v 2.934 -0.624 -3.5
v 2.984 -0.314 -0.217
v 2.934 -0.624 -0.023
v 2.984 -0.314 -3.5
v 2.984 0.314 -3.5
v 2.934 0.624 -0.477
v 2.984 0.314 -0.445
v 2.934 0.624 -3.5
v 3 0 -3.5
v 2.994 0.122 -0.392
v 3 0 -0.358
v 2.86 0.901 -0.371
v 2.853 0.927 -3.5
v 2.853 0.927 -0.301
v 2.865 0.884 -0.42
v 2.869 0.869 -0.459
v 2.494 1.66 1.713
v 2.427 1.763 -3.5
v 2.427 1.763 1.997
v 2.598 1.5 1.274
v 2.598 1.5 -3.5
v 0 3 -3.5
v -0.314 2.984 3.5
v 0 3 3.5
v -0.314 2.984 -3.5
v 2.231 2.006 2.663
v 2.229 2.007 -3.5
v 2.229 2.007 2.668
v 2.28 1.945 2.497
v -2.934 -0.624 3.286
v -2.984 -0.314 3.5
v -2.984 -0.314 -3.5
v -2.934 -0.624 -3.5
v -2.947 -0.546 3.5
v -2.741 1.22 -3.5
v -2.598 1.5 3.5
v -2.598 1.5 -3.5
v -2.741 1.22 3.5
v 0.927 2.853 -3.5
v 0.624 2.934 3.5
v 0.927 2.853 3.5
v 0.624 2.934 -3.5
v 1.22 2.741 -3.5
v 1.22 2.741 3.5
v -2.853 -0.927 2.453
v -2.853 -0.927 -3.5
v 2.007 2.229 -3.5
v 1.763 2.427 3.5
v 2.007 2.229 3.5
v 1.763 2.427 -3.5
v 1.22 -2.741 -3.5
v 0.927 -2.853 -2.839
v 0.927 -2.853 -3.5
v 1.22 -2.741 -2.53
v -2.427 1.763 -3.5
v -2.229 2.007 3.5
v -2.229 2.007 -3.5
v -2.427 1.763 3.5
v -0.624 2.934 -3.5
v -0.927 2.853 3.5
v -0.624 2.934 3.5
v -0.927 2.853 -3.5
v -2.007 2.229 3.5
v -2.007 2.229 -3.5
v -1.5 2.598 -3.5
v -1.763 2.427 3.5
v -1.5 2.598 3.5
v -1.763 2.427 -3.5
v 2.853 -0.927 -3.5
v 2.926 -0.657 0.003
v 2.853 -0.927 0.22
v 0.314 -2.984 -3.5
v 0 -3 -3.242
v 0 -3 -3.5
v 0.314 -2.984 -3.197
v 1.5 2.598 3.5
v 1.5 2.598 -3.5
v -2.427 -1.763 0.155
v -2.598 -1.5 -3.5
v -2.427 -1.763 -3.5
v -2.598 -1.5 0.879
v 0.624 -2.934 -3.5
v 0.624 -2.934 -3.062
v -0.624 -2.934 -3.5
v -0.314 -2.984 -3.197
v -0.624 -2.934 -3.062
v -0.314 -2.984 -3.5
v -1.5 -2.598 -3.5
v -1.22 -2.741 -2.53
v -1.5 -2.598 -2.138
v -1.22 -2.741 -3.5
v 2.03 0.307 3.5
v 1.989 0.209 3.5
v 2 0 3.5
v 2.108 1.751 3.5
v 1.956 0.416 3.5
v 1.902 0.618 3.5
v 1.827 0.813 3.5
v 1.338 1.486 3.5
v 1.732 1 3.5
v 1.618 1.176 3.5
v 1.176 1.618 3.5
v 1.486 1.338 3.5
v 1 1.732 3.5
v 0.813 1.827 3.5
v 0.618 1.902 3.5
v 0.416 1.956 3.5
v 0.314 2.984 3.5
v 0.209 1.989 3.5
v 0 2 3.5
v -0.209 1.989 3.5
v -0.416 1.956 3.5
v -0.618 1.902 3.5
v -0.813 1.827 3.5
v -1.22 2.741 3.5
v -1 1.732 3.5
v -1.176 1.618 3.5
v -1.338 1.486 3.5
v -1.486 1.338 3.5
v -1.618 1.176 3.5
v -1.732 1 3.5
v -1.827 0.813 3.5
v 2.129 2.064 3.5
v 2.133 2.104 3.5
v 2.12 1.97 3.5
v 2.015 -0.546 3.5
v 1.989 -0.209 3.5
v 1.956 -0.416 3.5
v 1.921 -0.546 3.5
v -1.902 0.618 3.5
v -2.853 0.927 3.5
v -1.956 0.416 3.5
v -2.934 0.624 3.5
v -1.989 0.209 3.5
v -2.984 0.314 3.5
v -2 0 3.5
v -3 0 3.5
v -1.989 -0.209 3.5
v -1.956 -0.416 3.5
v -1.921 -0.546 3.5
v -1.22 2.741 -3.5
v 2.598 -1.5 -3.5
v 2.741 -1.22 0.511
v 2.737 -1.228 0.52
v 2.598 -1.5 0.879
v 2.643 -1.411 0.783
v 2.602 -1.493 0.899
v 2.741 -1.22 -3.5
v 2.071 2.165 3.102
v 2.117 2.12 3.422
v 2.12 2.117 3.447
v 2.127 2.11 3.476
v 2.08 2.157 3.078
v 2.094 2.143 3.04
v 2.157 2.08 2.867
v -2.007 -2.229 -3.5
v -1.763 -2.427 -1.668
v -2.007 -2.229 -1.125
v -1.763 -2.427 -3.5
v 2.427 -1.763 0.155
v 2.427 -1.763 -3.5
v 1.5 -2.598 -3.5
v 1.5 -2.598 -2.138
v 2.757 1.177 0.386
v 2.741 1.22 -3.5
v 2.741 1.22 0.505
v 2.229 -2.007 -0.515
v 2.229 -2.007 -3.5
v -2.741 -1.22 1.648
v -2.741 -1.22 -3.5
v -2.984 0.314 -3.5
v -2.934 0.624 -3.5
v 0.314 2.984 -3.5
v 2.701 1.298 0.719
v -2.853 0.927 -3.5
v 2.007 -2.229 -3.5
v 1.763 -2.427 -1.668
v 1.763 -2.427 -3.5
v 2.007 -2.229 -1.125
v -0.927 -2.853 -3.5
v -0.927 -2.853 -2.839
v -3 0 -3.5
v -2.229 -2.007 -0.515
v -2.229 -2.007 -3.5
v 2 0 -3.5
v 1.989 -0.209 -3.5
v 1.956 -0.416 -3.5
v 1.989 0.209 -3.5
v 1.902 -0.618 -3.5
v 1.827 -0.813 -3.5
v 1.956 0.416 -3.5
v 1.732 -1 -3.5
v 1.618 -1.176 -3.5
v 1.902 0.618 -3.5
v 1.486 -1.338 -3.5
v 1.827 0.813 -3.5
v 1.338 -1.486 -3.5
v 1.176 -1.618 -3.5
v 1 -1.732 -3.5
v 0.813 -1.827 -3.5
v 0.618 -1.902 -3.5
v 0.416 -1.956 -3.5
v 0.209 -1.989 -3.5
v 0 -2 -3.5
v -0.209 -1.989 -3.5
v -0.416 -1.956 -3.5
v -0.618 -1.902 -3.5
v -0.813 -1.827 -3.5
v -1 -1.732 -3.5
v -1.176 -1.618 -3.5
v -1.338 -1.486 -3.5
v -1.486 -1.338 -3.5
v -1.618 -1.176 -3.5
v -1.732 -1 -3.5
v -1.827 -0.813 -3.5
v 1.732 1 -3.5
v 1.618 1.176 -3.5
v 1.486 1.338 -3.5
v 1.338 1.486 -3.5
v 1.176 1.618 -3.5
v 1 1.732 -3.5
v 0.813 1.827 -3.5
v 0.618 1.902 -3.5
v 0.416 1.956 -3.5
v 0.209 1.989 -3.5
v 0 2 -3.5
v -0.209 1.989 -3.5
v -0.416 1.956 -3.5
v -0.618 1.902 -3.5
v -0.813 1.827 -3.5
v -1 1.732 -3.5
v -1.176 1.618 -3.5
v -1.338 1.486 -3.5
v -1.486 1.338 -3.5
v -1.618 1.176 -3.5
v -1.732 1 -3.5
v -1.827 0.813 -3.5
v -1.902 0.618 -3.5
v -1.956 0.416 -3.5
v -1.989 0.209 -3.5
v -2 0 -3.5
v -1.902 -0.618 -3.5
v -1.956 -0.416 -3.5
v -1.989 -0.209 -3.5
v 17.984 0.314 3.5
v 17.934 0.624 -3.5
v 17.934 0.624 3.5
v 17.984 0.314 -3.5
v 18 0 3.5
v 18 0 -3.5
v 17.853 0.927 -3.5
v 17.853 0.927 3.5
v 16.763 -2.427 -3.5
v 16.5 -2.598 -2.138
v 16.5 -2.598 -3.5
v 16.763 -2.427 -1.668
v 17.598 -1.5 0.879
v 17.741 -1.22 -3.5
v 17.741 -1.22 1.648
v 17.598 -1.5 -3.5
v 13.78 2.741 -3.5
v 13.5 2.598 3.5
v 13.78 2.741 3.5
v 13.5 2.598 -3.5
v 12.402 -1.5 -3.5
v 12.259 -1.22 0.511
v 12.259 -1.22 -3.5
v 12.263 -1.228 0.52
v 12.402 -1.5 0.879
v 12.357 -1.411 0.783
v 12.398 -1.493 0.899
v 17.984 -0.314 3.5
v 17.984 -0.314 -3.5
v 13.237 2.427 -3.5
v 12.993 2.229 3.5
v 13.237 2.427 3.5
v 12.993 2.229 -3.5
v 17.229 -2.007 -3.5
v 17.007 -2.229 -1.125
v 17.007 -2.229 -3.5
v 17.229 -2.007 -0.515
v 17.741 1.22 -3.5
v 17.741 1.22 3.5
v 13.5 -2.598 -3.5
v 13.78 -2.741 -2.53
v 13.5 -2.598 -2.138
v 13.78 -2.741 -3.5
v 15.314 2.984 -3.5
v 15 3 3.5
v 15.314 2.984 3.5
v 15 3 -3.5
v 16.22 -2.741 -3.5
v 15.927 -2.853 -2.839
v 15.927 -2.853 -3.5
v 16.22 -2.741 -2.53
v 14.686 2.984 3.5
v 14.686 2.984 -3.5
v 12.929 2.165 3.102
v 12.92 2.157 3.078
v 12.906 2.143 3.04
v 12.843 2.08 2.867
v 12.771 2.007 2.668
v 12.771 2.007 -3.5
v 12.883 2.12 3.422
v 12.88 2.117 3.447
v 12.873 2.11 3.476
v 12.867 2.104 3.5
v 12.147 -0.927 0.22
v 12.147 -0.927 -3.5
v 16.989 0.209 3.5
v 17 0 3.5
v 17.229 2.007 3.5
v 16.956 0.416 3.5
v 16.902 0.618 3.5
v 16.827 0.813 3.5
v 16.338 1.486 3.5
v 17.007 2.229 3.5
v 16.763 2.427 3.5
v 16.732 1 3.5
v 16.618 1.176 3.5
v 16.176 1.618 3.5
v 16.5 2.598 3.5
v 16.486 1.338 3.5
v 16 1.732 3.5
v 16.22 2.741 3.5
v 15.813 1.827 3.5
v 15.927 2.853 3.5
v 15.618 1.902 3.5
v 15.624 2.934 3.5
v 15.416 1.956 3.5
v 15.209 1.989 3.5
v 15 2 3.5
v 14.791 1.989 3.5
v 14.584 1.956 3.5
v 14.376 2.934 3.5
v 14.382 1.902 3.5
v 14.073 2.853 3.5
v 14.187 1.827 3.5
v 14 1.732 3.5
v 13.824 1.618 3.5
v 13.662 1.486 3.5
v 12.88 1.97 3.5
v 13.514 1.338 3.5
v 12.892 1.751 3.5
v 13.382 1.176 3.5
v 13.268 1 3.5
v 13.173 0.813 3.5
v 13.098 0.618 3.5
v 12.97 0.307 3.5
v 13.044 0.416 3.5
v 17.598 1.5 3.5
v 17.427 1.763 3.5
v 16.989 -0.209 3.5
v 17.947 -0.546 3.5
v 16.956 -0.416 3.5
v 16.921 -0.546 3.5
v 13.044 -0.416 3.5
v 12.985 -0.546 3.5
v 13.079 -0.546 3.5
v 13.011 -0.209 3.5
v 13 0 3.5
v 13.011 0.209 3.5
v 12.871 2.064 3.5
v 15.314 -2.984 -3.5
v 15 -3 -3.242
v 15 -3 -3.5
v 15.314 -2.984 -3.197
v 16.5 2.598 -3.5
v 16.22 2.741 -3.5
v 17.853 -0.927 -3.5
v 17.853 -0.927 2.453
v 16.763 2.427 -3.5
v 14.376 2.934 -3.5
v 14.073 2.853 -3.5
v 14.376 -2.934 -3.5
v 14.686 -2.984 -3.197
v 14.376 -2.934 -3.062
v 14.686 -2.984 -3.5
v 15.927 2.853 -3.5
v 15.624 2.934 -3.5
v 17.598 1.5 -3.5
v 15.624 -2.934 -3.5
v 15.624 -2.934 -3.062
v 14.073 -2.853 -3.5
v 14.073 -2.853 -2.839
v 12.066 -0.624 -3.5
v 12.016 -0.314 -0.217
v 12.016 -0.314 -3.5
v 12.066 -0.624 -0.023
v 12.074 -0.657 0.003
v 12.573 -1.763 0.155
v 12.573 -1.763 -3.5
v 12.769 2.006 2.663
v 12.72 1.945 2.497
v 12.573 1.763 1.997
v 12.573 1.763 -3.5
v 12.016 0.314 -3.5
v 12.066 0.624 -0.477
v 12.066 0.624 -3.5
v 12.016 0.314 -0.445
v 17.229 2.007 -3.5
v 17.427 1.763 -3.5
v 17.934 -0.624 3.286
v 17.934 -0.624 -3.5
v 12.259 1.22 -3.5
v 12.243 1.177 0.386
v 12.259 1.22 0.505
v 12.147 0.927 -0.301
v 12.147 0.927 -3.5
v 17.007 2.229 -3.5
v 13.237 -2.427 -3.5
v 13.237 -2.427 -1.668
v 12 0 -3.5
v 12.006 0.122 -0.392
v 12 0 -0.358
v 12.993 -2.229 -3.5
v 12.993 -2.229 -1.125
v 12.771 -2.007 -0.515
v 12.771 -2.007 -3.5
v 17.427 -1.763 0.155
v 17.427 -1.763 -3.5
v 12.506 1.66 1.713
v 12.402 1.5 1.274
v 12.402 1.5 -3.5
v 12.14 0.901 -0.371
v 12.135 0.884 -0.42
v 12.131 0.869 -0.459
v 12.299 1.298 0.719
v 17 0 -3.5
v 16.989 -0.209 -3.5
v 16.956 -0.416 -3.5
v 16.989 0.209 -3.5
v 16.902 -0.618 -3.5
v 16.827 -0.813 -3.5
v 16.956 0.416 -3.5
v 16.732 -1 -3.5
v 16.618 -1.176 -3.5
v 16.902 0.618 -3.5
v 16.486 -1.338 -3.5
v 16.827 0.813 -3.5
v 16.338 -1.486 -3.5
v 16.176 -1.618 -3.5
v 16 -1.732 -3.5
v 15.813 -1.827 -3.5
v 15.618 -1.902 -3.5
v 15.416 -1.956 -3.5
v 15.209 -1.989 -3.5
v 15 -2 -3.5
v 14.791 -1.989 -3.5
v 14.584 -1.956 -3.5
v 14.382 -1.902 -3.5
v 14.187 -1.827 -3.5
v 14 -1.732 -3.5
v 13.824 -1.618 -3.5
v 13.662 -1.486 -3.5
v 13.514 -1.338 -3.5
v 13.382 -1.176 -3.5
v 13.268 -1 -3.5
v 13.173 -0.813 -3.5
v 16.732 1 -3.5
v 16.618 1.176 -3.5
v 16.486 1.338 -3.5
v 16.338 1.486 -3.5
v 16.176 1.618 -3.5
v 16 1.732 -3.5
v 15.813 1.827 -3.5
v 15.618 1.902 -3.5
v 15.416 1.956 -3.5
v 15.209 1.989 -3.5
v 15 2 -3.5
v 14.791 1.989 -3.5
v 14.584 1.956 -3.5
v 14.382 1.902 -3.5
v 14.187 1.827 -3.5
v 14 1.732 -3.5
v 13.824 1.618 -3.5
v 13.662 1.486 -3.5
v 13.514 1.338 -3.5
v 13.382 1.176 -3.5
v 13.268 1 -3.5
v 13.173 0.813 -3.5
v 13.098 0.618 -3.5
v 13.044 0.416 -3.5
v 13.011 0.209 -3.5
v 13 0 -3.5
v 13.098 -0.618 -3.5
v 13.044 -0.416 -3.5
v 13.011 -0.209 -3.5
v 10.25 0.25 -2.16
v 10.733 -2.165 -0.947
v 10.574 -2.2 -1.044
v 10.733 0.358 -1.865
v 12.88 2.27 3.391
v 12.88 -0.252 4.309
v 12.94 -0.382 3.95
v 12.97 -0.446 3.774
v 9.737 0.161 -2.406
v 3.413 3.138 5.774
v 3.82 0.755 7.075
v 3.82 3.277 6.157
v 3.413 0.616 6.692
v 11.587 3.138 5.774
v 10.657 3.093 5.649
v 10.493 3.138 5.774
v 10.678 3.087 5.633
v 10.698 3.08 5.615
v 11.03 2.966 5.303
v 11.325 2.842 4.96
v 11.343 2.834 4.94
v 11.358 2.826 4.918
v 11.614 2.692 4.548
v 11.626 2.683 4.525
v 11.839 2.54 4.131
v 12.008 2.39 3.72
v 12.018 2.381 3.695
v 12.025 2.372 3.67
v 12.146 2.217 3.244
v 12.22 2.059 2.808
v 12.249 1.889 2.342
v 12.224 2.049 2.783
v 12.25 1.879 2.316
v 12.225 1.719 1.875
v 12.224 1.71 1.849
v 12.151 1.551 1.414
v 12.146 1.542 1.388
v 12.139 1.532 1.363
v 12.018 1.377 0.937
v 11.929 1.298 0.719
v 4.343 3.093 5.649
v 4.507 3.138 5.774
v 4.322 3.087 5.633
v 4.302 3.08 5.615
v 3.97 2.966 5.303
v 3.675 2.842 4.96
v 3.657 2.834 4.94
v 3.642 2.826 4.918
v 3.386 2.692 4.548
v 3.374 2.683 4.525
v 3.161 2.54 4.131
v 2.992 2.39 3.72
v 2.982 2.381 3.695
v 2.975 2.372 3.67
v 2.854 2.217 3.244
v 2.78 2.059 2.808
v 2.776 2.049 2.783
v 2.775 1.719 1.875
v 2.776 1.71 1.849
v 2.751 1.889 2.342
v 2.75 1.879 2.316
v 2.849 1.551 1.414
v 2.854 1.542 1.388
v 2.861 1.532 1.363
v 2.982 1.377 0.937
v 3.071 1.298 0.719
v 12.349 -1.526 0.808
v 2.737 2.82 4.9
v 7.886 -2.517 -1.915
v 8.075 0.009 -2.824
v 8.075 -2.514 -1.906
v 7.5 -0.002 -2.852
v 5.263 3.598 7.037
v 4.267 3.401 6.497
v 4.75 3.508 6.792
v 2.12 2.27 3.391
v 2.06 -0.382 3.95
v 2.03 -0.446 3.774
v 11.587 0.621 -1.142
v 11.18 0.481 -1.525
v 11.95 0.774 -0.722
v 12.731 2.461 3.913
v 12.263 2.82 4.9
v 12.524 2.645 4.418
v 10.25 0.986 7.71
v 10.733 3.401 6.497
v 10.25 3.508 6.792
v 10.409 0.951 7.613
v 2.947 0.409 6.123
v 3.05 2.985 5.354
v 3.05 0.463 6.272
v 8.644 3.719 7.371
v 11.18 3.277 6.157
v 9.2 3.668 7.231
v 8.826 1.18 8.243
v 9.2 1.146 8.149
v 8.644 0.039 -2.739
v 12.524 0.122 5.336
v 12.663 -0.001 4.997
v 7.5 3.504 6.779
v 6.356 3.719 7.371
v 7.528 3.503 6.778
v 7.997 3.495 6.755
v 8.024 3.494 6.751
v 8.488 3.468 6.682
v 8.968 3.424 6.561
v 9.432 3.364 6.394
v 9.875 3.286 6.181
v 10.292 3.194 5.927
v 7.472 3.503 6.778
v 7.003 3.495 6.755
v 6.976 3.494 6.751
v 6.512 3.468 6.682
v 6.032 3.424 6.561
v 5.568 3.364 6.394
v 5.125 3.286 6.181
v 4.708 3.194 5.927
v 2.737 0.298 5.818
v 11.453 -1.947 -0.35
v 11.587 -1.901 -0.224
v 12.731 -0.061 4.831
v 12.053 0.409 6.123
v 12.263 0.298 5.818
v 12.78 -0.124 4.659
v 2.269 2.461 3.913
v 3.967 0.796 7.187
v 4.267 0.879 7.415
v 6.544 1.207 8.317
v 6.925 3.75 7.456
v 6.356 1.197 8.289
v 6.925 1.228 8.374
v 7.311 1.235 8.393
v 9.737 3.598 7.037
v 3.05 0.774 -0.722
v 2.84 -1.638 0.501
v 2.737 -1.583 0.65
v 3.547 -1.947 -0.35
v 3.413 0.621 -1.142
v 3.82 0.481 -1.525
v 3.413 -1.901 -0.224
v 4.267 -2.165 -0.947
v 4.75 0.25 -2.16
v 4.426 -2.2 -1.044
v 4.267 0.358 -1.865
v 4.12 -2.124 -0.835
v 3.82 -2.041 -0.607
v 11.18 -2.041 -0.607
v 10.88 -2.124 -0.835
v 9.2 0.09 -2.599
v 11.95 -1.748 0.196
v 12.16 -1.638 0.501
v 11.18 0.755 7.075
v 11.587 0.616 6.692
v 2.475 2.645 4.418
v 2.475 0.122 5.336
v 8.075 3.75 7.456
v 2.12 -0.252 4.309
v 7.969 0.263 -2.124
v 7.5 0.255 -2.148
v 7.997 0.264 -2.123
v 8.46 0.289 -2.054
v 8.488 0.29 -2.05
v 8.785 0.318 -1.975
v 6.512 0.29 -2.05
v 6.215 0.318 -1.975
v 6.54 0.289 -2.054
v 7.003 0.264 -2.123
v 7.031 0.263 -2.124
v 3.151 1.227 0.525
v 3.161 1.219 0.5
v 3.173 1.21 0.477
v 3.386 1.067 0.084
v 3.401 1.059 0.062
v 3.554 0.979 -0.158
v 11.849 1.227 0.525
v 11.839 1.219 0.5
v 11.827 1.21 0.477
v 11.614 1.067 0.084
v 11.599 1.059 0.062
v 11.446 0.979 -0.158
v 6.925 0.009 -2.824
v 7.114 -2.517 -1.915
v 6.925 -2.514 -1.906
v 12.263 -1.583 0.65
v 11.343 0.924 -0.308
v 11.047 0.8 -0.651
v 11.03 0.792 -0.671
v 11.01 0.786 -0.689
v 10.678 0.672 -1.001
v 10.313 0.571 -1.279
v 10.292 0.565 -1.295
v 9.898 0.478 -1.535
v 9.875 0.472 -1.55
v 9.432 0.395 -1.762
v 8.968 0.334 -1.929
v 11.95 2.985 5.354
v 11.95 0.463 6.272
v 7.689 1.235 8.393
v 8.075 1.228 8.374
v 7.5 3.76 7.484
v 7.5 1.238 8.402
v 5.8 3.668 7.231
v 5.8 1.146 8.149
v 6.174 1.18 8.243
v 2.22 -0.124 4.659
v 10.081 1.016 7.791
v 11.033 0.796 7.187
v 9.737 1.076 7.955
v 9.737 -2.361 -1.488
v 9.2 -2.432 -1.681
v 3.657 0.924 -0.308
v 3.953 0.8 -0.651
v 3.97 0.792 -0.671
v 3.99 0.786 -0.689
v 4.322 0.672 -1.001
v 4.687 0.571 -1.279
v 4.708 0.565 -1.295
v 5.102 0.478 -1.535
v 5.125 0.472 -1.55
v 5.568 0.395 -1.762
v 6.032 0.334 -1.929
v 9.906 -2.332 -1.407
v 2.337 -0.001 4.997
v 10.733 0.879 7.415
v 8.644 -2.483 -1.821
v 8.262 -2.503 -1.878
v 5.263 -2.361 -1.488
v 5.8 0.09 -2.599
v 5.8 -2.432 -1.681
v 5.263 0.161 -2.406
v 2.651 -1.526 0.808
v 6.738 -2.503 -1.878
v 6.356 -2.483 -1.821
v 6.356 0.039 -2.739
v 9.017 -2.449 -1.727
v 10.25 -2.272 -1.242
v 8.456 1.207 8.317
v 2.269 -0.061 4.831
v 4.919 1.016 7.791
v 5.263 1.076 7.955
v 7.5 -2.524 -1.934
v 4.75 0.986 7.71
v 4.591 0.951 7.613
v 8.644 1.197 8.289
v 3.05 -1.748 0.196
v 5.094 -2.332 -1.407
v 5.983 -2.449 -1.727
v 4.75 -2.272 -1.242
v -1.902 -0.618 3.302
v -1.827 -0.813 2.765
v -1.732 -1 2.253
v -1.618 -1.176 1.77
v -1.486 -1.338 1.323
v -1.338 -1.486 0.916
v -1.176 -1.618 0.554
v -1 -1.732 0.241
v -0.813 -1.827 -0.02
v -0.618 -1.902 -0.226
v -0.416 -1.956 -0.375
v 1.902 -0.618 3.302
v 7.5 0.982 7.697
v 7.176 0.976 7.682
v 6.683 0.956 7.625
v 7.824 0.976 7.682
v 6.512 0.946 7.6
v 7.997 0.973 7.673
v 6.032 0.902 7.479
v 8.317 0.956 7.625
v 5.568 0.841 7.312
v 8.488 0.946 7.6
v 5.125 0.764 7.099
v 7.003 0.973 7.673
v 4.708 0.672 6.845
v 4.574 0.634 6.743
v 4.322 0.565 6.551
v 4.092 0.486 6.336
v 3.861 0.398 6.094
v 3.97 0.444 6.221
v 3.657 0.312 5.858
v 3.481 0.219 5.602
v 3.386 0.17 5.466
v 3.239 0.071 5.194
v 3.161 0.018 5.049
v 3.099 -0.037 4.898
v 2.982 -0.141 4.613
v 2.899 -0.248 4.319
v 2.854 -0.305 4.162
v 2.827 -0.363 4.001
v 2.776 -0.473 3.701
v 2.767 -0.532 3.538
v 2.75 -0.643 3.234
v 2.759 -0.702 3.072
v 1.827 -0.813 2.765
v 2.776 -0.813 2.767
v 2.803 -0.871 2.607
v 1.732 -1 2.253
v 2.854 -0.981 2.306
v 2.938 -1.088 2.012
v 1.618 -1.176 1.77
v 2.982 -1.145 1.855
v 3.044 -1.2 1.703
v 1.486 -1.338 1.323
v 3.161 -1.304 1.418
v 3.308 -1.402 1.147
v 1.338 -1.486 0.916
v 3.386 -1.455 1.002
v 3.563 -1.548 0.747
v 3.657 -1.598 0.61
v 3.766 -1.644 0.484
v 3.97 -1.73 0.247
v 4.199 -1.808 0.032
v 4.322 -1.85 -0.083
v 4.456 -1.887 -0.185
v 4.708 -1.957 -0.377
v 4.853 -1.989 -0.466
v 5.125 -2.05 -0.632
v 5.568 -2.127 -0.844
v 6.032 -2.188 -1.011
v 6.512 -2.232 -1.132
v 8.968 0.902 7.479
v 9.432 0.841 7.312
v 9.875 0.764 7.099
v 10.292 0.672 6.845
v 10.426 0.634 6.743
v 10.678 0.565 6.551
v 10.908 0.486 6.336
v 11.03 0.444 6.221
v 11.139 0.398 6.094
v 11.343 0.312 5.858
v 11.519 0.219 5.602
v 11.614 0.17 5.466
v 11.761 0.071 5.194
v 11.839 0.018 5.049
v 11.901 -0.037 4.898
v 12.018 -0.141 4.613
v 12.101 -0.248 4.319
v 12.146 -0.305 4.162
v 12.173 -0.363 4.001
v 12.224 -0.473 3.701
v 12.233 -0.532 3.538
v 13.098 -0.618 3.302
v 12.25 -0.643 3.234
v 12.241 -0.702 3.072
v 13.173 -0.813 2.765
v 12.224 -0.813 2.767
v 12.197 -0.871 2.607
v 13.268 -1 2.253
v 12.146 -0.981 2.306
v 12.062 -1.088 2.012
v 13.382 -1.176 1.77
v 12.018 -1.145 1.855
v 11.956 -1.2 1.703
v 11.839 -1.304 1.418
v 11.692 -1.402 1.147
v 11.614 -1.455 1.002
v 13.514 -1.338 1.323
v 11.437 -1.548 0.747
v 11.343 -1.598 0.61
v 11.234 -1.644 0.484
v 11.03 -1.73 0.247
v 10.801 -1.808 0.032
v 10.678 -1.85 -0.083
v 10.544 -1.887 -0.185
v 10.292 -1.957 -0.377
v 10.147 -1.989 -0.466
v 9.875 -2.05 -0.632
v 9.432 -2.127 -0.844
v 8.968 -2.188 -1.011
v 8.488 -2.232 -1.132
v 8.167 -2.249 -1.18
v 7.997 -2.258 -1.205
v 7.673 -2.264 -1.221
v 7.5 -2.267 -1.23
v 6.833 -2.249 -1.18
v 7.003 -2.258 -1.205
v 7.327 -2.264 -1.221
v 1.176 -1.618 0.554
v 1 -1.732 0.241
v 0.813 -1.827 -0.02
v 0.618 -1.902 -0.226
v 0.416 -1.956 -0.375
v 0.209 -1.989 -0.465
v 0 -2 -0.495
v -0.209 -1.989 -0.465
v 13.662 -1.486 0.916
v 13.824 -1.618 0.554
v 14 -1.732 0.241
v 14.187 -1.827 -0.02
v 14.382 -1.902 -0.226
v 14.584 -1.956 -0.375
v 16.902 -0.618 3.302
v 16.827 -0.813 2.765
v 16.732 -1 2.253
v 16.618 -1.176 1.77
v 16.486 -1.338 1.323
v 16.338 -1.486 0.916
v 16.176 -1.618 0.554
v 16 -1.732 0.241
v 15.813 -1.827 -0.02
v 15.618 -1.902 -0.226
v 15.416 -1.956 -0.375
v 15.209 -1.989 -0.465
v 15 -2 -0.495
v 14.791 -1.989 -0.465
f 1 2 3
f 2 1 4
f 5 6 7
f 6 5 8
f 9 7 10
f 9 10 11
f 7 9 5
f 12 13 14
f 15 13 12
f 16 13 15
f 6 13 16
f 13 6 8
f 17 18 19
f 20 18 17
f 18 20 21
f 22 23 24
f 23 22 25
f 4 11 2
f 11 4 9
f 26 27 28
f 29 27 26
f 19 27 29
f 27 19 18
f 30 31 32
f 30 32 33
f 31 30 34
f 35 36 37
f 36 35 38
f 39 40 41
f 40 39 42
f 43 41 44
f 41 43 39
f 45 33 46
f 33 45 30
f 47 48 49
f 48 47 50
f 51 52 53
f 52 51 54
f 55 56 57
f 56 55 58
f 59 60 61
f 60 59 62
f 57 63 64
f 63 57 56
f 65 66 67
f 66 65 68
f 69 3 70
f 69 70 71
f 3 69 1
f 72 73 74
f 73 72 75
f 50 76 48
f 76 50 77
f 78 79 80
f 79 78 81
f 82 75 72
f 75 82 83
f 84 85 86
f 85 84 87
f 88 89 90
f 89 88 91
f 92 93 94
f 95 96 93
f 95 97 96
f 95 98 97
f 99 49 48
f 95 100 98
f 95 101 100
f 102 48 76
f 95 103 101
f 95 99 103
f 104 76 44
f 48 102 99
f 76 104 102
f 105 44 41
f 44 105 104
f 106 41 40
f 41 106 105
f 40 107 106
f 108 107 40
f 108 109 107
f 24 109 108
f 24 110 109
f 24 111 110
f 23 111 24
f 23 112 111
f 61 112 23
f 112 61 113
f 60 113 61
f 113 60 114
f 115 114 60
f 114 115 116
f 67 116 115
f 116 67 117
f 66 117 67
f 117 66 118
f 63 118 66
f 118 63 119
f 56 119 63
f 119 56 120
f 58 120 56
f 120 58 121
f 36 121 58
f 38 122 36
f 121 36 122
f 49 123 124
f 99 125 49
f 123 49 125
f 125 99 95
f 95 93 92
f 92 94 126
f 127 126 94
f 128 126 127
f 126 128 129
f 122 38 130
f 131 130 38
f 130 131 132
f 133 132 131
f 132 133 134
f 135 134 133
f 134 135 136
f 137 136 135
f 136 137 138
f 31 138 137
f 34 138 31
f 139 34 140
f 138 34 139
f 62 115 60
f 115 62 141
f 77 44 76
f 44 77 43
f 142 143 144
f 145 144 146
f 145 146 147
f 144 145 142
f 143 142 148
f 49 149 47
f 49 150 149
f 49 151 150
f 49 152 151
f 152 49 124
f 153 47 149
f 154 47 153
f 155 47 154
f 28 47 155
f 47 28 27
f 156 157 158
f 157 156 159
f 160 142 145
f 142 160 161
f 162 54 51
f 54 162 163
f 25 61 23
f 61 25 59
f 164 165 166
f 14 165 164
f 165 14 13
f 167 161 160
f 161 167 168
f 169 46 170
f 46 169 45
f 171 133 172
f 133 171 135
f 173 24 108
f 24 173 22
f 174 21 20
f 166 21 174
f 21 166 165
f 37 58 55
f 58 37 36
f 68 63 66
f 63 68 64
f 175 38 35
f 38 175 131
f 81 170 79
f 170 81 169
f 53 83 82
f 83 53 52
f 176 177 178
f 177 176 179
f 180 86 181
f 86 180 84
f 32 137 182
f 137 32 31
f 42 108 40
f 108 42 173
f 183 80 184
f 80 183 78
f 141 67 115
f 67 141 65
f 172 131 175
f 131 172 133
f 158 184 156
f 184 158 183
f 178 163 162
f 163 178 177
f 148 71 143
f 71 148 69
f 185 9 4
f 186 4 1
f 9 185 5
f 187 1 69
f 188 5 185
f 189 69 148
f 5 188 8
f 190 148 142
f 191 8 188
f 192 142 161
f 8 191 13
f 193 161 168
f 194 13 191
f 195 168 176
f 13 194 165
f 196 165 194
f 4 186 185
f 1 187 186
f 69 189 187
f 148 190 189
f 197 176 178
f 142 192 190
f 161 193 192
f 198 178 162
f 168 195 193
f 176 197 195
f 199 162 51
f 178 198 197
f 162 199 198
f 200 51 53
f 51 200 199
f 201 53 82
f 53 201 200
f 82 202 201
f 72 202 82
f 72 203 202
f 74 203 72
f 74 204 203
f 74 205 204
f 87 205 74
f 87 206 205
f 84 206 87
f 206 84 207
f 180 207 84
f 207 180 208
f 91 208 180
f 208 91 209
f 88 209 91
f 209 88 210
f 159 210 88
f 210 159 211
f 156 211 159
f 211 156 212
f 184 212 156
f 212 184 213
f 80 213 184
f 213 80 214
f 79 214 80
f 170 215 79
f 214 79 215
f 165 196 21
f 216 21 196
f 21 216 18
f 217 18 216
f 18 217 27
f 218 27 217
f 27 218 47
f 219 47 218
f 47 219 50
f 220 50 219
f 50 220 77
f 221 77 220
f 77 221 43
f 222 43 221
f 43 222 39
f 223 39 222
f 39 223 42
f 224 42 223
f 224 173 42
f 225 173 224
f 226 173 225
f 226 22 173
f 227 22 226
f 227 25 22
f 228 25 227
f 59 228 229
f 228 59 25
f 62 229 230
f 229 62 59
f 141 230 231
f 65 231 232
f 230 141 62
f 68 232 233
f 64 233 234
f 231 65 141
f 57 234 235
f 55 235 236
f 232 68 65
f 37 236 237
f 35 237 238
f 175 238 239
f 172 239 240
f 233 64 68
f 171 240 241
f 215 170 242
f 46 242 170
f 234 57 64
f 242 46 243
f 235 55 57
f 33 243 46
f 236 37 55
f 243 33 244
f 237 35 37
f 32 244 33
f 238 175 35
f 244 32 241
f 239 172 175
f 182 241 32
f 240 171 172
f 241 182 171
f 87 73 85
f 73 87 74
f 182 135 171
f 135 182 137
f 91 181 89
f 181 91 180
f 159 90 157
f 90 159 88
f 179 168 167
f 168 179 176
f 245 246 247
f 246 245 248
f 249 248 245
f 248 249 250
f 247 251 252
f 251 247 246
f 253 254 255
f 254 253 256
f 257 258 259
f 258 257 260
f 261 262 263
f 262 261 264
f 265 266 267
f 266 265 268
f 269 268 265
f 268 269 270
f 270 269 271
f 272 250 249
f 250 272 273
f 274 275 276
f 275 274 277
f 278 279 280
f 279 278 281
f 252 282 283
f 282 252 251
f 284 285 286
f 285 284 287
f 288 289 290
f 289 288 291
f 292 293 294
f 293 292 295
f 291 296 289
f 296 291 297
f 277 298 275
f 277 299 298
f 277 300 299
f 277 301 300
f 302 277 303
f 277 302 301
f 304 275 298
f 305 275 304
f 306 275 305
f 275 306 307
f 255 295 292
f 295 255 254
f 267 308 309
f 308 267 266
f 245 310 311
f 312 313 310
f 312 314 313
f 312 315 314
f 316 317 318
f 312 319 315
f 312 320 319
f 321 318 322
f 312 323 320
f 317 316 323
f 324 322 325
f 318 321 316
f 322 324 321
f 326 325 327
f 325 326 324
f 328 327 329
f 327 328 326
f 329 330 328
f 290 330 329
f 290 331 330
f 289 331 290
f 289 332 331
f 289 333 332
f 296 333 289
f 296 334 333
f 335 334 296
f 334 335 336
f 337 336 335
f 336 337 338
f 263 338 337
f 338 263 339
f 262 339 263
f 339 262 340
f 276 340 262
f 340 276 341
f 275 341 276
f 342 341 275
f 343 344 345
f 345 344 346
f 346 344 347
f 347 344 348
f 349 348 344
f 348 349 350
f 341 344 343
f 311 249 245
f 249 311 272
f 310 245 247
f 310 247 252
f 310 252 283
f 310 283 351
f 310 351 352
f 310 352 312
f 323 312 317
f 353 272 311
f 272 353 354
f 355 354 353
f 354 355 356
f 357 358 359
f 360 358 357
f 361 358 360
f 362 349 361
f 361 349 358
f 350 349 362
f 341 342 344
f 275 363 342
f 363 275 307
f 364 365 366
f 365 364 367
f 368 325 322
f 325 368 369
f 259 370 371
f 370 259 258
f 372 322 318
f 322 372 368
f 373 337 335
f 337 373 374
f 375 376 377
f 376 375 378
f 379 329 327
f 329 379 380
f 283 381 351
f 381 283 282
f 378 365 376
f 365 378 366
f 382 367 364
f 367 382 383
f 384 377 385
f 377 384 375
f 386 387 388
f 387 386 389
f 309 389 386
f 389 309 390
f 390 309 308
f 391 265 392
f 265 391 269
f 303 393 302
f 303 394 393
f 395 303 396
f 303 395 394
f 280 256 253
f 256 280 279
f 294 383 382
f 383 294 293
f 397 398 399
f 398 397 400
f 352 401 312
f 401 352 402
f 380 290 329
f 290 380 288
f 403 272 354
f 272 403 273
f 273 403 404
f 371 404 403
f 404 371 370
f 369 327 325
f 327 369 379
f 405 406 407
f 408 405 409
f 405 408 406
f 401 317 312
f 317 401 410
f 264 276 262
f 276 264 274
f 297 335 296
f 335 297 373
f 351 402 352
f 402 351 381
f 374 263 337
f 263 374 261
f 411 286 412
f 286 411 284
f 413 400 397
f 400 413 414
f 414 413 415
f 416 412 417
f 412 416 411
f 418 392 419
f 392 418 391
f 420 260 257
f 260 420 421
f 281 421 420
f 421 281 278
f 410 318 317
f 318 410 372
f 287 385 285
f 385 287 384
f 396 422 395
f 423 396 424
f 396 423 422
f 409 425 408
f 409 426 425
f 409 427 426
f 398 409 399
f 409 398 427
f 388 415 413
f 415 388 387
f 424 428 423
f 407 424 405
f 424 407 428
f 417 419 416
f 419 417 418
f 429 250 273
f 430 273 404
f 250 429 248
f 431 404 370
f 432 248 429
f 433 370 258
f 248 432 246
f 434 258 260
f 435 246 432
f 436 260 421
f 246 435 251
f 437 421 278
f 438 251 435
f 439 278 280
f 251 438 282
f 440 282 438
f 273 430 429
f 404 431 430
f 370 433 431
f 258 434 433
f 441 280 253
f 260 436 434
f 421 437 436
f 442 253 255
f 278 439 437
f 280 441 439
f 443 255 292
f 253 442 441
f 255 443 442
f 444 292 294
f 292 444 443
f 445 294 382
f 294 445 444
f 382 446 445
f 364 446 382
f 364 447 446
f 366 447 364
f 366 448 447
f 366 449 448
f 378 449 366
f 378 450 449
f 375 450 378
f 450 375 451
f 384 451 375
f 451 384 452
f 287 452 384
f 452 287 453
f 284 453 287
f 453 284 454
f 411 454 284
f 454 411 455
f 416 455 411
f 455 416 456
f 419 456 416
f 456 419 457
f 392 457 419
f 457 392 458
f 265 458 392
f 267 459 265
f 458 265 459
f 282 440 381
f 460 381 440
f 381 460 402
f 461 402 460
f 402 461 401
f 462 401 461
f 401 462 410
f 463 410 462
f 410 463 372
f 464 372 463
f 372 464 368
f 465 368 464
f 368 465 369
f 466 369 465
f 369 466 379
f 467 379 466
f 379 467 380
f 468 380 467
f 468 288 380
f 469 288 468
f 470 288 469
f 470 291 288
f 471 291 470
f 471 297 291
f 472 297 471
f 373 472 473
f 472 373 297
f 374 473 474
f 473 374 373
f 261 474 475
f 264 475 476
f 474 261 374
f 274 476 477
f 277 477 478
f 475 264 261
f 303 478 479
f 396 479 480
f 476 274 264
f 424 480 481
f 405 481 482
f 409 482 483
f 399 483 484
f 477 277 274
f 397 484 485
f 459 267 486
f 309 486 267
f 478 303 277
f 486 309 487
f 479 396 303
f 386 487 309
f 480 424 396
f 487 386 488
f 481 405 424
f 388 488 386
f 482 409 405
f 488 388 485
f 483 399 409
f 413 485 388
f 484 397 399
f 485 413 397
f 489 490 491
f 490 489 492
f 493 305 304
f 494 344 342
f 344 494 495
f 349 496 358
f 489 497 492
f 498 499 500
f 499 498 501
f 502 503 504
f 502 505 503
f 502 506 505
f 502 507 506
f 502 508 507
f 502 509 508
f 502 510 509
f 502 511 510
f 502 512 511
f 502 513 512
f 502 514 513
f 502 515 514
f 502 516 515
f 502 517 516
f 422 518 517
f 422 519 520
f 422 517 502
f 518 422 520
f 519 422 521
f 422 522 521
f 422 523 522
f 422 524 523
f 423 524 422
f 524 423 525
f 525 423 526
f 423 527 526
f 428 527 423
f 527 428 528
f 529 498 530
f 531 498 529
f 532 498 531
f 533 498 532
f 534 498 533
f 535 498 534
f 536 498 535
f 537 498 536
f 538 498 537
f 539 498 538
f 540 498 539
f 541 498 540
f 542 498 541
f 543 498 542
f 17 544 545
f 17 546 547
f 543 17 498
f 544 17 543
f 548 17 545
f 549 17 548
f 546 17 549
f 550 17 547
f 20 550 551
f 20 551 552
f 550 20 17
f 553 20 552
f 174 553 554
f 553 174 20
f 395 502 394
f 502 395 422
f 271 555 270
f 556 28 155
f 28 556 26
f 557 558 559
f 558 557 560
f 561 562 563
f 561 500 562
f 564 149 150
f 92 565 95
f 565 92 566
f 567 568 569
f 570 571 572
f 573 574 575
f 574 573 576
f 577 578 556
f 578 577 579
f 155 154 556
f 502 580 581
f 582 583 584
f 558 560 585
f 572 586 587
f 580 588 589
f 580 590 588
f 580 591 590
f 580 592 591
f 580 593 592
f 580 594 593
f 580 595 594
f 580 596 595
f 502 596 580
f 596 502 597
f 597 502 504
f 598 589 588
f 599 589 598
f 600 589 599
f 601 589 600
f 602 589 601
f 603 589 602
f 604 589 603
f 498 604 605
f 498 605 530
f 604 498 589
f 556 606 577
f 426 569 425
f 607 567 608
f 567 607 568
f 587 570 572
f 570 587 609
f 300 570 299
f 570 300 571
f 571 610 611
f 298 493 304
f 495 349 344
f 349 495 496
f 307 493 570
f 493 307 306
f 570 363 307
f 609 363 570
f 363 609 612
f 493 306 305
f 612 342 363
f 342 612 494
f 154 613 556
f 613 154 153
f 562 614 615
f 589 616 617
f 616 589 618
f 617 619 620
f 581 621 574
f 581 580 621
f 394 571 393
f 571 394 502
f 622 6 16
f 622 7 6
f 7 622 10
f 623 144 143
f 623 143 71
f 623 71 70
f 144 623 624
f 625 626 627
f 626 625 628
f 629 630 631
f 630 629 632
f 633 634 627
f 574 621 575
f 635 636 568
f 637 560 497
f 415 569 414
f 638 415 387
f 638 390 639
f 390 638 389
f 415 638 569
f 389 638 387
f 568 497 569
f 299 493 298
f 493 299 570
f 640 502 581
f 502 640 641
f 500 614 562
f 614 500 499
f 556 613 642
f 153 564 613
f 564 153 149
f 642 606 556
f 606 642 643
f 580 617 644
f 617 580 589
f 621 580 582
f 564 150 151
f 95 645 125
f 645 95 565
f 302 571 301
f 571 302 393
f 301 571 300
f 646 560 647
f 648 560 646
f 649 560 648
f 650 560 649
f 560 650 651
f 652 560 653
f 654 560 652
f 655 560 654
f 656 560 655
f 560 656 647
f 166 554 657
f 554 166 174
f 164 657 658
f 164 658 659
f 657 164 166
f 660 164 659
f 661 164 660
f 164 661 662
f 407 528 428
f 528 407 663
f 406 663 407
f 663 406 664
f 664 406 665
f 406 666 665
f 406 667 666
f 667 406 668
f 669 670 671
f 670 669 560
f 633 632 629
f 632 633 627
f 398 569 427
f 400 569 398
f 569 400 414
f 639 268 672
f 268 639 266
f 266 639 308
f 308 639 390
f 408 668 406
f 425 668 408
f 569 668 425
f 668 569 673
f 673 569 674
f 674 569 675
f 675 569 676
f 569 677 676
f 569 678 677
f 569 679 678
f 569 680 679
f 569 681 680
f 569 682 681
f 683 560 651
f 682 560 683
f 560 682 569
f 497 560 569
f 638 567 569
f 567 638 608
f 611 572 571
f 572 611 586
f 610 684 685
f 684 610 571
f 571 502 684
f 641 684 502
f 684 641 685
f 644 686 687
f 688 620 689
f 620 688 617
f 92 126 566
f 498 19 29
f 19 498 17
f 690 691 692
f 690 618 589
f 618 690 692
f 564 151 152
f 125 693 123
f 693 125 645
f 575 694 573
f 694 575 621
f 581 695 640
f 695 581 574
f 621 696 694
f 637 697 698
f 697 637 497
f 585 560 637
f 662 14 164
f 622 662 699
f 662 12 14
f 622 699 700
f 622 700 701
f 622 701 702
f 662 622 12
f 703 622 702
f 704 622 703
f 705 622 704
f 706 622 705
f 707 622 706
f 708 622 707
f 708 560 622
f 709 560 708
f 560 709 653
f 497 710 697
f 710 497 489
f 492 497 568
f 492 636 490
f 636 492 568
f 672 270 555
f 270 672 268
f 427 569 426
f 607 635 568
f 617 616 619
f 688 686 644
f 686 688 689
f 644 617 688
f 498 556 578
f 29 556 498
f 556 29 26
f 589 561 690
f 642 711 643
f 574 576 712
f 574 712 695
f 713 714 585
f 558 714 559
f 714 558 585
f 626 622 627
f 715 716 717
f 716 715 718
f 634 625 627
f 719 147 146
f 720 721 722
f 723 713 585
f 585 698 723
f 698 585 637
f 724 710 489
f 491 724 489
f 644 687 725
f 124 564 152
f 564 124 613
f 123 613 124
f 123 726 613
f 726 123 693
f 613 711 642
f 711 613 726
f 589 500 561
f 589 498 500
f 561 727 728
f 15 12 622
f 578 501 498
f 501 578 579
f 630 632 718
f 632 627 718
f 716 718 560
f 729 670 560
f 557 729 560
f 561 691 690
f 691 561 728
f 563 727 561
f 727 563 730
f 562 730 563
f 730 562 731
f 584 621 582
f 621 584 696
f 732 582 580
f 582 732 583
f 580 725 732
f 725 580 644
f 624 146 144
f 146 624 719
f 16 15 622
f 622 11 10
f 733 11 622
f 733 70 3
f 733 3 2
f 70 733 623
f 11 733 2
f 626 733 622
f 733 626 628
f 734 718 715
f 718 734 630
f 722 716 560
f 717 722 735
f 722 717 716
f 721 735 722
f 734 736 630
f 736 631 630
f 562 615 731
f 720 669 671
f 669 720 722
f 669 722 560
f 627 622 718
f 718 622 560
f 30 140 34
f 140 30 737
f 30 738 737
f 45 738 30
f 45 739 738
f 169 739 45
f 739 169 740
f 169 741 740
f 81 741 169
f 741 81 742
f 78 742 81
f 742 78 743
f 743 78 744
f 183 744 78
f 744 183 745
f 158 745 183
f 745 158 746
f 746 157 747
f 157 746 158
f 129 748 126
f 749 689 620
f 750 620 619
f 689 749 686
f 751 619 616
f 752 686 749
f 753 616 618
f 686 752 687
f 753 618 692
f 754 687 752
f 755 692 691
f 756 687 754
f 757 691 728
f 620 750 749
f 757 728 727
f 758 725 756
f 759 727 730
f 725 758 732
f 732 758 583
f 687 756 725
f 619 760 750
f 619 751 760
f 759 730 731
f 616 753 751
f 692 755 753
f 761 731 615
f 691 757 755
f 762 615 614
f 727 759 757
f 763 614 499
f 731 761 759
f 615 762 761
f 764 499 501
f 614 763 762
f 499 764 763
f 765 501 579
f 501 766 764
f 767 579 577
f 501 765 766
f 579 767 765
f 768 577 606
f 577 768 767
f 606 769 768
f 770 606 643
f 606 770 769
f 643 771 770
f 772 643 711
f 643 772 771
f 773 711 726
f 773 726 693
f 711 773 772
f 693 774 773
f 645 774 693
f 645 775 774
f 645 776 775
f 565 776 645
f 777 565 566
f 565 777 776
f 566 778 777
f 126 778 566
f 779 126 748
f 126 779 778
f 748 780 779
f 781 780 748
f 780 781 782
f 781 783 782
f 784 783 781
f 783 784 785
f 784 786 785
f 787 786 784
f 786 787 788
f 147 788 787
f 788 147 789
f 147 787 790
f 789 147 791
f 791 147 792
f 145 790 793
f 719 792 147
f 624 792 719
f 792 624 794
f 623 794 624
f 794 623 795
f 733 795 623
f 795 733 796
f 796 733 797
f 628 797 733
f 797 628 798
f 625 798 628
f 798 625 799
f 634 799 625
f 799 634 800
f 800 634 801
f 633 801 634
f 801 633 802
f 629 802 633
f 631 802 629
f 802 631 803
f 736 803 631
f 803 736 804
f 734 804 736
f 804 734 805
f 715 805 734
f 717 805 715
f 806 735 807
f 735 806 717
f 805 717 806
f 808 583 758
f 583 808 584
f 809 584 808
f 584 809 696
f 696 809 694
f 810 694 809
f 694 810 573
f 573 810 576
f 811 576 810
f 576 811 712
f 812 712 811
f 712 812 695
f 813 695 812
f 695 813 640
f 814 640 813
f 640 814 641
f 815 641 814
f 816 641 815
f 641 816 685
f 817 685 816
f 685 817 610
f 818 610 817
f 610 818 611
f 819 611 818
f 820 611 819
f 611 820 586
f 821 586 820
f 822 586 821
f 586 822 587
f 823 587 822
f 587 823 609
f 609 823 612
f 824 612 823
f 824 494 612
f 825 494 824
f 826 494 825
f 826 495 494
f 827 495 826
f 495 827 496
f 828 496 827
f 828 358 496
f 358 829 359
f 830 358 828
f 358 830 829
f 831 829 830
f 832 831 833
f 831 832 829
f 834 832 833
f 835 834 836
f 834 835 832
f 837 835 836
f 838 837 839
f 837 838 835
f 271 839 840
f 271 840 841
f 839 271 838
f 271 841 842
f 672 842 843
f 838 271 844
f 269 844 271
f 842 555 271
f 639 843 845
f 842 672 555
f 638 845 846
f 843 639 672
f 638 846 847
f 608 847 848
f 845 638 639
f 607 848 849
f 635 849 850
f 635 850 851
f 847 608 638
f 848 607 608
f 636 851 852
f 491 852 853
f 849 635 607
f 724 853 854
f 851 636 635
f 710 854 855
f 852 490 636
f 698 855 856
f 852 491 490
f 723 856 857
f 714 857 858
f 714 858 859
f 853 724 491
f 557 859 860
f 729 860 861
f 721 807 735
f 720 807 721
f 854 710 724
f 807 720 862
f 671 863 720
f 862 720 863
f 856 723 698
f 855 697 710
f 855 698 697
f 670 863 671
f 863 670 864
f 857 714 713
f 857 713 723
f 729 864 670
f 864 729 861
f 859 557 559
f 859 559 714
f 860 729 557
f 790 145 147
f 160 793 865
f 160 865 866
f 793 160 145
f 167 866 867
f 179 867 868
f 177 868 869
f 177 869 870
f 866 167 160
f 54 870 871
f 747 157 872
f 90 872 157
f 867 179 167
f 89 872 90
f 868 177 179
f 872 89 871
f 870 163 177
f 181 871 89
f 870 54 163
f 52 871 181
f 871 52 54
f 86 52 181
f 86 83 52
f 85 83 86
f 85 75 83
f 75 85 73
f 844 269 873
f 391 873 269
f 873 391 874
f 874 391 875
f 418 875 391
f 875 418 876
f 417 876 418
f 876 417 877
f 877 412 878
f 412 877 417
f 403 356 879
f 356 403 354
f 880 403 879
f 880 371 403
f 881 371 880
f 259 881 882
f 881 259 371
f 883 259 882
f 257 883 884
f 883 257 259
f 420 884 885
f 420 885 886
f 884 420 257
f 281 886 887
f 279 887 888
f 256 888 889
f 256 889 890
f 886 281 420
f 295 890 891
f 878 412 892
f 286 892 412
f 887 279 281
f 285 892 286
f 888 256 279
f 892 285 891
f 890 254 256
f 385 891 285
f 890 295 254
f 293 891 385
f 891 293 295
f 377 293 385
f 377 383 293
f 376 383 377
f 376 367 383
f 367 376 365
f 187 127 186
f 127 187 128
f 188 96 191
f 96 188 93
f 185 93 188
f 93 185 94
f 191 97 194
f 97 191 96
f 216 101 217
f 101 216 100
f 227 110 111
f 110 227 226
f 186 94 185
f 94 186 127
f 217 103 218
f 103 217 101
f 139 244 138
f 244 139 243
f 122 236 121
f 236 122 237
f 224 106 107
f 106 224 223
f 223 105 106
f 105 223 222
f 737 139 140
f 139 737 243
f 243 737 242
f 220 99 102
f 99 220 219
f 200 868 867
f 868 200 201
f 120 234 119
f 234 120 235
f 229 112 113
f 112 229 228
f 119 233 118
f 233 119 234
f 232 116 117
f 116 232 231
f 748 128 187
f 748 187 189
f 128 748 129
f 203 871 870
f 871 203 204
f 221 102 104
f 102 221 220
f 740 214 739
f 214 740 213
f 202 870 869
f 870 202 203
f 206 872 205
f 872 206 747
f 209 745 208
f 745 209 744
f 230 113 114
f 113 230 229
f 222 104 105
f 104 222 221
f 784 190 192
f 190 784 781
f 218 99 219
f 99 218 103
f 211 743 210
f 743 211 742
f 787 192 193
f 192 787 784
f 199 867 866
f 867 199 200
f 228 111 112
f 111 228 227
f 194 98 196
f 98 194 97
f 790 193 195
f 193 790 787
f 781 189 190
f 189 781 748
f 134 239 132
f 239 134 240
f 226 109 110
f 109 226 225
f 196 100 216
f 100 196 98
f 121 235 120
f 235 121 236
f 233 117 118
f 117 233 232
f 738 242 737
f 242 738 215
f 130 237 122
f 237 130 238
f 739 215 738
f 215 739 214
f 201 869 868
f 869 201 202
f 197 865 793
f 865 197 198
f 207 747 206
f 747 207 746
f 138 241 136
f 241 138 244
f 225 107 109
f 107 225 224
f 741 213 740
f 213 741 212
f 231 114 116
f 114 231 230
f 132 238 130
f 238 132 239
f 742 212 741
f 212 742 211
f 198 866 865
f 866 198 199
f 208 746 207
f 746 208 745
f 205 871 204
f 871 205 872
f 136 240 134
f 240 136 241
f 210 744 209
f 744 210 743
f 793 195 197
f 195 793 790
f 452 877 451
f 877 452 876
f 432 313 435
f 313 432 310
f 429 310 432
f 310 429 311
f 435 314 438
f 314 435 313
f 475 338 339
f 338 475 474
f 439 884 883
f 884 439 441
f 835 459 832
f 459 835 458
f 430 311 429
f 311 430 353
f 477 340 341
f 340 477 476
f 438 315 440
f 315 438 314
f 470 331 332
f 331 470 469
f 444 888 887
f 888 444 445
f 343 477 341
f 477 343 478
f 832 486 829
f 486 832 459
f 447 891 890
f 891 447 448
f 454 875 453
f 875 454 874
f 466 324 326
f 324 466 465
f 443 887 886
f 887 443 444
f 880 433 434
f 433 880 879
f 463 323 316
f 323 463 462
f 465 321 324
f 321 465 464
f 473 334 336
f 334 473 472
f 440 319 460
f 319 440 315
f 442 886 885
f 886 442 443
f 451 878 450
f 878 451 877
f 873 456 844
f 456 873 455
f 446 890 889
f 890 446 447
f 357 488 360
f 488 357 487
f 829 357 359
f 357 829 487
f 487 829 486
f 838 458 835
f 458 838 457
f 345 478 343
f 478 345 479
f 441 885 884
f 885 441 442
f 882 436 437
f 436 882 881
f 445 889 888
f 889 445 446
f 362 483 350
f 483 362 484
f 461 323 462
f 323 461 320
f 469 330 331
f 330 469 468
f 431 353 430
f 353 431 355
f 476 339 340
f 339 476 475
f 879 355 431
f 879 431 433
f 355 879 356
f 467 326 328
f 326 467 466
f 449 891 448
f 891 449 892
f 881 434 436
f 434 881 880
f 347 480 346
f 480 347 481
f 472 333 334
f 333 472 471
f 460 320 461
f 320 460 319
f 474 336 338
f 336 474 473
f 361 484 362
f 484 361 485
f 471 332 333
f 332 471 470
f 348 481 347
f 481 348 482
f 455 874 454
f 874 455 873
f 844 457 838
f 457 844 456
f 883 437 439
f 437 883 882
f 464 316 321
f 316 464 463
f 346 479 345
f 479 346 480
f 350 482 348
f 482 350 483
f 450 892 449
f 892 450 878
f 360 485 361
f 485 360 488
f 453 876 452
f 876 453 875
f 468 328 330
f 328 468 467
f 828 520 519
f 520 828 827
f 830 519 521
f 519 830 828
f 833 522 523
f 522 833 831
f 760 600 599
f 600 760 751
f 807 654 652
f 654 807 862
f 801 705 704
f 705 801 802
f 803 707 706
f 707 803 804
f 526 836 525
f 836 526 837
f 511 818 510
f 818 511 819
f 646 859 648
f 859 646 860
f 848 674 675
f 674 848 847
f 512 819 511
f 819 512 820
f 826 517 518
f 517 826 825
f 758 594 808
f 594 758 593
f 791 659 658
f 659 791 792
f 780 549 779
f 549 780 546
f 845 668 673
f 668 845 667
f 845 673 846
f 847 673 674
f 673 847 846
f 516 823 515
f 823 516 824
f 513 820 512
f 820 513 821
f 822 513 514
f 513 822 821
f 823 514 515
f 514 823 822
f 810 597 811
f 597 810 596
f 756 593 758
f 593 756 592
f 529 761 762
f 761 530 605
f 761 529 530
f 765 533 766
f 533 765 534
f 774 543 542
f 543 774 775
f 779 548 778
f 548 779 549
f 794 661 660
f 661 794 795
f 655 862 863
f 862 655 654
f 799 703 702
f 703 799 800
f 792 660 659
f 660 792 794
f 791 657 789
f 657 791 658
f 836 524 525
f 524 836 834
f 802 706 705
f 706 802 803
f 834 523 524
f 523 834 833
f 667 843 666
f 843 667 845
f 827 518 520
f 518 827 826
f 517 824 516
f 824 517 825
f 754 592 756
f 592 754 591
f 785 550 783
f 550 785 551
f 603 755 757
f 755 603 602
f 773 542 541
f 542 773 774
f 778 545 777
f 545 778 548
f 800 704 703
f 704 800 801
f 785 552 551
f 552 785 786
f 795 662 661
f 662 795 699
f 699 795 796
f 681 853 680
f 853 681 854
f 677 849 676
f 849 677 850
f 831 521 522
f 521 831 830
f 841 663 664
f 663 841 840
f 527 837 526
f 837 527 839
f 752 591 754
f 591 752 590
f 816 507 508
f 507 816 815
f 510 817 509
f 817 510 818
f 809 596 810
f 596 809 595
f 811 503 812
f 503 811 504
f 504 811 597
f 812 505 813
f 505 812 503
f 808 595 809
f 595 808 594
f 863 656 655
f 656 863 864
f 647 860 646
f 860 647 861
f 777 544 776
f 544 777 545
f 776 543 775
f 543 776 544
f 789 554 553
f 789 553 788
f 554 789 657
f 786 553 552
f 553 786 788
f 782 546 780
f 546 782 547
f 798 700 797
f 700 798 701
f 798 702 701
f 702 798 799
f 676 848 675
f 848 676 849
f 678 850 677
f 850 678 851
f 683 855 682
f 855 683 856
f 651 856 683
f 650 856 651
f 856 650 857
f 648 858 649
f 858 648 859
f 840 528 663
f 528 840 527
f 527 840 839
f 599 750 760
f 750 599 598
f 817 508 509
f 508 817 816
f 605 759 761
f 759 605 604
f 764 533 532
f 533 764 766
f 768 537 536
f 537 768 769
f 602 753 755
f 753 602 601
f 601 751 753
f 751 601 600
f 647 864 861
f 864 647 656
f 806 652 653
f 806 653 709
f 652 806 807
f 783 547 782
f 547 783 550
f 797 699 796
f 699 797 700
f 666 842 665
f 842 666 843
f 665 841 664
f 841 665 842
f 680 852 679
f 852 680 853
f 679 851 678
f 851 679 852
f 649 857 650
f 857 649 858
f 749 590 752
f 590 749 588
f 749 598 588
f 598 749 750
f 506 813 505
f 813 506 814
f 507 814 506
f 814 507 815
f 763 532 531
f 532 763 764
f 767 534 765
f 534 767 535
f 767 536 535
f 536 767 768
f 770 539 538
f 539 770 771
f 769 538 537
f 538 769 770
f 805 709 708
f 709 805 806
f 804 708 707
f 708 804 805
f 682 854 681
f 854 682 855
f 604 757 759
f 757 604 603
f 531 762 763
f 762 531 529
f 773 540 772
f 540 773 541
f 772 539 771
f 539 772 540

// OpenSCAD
cam_angle=20;
cam_height=4;
cam_hole=9.5;
cam_offset_y=0;
cam_width=13;

cut=0.5;
cutout_size=30;

$fn=60;

//2s
standoff_height=7;
standoff_width=6;
standoff_hole=4;
standoff_distance=15;
cam_width=11;       //11
cam_offset_z=cam_height*0.5+1;    
total_height=15;




difference() {
    union() {
        //left standoff
        cylinder(d=standoff_width,h=standoff_height,center=true);
        //rightstandoff
        translate([standoff_distance,0,0])
            cylinder(d=standoff_width,h=standoff_height,center=true);
            
        //cam
        translate([standoff_distance*0.5,cam_offset_y,cam_offset_z])
            rotate([90-cam_angle,0,0])
                cylinder(d=cam_width,h=cam_height,center=true);

    }

    union() {
        //cut out angle for printing
        translate([-standoff_width,cam_offset_y,cam_height*0.5+cam_offset_z])
            rotate([90-cam_angle,0,0])
                translate([0,-cutout_size*0.5,0])
                    cube([standoff_distance*2,cutout_size,20],center=false);
        
        //holes
        
        //left standoff
        cylinder(d=standoff_hole,h=standoff_height+cut,center=true);
        
        //right standoff
        translate([standoff_distance,0,0])
            cylinder(d=standoff_hole,h=standoff_height+cut,center=true);
            
        //cam
        translate([standoff_distance*0.5,cam_offset_y,cam_offset_z])
            rotate([90-cam_angle,0,0])
                cylinder(d=cam_hole,h=cam_height+cut,center=true);
    }
}
